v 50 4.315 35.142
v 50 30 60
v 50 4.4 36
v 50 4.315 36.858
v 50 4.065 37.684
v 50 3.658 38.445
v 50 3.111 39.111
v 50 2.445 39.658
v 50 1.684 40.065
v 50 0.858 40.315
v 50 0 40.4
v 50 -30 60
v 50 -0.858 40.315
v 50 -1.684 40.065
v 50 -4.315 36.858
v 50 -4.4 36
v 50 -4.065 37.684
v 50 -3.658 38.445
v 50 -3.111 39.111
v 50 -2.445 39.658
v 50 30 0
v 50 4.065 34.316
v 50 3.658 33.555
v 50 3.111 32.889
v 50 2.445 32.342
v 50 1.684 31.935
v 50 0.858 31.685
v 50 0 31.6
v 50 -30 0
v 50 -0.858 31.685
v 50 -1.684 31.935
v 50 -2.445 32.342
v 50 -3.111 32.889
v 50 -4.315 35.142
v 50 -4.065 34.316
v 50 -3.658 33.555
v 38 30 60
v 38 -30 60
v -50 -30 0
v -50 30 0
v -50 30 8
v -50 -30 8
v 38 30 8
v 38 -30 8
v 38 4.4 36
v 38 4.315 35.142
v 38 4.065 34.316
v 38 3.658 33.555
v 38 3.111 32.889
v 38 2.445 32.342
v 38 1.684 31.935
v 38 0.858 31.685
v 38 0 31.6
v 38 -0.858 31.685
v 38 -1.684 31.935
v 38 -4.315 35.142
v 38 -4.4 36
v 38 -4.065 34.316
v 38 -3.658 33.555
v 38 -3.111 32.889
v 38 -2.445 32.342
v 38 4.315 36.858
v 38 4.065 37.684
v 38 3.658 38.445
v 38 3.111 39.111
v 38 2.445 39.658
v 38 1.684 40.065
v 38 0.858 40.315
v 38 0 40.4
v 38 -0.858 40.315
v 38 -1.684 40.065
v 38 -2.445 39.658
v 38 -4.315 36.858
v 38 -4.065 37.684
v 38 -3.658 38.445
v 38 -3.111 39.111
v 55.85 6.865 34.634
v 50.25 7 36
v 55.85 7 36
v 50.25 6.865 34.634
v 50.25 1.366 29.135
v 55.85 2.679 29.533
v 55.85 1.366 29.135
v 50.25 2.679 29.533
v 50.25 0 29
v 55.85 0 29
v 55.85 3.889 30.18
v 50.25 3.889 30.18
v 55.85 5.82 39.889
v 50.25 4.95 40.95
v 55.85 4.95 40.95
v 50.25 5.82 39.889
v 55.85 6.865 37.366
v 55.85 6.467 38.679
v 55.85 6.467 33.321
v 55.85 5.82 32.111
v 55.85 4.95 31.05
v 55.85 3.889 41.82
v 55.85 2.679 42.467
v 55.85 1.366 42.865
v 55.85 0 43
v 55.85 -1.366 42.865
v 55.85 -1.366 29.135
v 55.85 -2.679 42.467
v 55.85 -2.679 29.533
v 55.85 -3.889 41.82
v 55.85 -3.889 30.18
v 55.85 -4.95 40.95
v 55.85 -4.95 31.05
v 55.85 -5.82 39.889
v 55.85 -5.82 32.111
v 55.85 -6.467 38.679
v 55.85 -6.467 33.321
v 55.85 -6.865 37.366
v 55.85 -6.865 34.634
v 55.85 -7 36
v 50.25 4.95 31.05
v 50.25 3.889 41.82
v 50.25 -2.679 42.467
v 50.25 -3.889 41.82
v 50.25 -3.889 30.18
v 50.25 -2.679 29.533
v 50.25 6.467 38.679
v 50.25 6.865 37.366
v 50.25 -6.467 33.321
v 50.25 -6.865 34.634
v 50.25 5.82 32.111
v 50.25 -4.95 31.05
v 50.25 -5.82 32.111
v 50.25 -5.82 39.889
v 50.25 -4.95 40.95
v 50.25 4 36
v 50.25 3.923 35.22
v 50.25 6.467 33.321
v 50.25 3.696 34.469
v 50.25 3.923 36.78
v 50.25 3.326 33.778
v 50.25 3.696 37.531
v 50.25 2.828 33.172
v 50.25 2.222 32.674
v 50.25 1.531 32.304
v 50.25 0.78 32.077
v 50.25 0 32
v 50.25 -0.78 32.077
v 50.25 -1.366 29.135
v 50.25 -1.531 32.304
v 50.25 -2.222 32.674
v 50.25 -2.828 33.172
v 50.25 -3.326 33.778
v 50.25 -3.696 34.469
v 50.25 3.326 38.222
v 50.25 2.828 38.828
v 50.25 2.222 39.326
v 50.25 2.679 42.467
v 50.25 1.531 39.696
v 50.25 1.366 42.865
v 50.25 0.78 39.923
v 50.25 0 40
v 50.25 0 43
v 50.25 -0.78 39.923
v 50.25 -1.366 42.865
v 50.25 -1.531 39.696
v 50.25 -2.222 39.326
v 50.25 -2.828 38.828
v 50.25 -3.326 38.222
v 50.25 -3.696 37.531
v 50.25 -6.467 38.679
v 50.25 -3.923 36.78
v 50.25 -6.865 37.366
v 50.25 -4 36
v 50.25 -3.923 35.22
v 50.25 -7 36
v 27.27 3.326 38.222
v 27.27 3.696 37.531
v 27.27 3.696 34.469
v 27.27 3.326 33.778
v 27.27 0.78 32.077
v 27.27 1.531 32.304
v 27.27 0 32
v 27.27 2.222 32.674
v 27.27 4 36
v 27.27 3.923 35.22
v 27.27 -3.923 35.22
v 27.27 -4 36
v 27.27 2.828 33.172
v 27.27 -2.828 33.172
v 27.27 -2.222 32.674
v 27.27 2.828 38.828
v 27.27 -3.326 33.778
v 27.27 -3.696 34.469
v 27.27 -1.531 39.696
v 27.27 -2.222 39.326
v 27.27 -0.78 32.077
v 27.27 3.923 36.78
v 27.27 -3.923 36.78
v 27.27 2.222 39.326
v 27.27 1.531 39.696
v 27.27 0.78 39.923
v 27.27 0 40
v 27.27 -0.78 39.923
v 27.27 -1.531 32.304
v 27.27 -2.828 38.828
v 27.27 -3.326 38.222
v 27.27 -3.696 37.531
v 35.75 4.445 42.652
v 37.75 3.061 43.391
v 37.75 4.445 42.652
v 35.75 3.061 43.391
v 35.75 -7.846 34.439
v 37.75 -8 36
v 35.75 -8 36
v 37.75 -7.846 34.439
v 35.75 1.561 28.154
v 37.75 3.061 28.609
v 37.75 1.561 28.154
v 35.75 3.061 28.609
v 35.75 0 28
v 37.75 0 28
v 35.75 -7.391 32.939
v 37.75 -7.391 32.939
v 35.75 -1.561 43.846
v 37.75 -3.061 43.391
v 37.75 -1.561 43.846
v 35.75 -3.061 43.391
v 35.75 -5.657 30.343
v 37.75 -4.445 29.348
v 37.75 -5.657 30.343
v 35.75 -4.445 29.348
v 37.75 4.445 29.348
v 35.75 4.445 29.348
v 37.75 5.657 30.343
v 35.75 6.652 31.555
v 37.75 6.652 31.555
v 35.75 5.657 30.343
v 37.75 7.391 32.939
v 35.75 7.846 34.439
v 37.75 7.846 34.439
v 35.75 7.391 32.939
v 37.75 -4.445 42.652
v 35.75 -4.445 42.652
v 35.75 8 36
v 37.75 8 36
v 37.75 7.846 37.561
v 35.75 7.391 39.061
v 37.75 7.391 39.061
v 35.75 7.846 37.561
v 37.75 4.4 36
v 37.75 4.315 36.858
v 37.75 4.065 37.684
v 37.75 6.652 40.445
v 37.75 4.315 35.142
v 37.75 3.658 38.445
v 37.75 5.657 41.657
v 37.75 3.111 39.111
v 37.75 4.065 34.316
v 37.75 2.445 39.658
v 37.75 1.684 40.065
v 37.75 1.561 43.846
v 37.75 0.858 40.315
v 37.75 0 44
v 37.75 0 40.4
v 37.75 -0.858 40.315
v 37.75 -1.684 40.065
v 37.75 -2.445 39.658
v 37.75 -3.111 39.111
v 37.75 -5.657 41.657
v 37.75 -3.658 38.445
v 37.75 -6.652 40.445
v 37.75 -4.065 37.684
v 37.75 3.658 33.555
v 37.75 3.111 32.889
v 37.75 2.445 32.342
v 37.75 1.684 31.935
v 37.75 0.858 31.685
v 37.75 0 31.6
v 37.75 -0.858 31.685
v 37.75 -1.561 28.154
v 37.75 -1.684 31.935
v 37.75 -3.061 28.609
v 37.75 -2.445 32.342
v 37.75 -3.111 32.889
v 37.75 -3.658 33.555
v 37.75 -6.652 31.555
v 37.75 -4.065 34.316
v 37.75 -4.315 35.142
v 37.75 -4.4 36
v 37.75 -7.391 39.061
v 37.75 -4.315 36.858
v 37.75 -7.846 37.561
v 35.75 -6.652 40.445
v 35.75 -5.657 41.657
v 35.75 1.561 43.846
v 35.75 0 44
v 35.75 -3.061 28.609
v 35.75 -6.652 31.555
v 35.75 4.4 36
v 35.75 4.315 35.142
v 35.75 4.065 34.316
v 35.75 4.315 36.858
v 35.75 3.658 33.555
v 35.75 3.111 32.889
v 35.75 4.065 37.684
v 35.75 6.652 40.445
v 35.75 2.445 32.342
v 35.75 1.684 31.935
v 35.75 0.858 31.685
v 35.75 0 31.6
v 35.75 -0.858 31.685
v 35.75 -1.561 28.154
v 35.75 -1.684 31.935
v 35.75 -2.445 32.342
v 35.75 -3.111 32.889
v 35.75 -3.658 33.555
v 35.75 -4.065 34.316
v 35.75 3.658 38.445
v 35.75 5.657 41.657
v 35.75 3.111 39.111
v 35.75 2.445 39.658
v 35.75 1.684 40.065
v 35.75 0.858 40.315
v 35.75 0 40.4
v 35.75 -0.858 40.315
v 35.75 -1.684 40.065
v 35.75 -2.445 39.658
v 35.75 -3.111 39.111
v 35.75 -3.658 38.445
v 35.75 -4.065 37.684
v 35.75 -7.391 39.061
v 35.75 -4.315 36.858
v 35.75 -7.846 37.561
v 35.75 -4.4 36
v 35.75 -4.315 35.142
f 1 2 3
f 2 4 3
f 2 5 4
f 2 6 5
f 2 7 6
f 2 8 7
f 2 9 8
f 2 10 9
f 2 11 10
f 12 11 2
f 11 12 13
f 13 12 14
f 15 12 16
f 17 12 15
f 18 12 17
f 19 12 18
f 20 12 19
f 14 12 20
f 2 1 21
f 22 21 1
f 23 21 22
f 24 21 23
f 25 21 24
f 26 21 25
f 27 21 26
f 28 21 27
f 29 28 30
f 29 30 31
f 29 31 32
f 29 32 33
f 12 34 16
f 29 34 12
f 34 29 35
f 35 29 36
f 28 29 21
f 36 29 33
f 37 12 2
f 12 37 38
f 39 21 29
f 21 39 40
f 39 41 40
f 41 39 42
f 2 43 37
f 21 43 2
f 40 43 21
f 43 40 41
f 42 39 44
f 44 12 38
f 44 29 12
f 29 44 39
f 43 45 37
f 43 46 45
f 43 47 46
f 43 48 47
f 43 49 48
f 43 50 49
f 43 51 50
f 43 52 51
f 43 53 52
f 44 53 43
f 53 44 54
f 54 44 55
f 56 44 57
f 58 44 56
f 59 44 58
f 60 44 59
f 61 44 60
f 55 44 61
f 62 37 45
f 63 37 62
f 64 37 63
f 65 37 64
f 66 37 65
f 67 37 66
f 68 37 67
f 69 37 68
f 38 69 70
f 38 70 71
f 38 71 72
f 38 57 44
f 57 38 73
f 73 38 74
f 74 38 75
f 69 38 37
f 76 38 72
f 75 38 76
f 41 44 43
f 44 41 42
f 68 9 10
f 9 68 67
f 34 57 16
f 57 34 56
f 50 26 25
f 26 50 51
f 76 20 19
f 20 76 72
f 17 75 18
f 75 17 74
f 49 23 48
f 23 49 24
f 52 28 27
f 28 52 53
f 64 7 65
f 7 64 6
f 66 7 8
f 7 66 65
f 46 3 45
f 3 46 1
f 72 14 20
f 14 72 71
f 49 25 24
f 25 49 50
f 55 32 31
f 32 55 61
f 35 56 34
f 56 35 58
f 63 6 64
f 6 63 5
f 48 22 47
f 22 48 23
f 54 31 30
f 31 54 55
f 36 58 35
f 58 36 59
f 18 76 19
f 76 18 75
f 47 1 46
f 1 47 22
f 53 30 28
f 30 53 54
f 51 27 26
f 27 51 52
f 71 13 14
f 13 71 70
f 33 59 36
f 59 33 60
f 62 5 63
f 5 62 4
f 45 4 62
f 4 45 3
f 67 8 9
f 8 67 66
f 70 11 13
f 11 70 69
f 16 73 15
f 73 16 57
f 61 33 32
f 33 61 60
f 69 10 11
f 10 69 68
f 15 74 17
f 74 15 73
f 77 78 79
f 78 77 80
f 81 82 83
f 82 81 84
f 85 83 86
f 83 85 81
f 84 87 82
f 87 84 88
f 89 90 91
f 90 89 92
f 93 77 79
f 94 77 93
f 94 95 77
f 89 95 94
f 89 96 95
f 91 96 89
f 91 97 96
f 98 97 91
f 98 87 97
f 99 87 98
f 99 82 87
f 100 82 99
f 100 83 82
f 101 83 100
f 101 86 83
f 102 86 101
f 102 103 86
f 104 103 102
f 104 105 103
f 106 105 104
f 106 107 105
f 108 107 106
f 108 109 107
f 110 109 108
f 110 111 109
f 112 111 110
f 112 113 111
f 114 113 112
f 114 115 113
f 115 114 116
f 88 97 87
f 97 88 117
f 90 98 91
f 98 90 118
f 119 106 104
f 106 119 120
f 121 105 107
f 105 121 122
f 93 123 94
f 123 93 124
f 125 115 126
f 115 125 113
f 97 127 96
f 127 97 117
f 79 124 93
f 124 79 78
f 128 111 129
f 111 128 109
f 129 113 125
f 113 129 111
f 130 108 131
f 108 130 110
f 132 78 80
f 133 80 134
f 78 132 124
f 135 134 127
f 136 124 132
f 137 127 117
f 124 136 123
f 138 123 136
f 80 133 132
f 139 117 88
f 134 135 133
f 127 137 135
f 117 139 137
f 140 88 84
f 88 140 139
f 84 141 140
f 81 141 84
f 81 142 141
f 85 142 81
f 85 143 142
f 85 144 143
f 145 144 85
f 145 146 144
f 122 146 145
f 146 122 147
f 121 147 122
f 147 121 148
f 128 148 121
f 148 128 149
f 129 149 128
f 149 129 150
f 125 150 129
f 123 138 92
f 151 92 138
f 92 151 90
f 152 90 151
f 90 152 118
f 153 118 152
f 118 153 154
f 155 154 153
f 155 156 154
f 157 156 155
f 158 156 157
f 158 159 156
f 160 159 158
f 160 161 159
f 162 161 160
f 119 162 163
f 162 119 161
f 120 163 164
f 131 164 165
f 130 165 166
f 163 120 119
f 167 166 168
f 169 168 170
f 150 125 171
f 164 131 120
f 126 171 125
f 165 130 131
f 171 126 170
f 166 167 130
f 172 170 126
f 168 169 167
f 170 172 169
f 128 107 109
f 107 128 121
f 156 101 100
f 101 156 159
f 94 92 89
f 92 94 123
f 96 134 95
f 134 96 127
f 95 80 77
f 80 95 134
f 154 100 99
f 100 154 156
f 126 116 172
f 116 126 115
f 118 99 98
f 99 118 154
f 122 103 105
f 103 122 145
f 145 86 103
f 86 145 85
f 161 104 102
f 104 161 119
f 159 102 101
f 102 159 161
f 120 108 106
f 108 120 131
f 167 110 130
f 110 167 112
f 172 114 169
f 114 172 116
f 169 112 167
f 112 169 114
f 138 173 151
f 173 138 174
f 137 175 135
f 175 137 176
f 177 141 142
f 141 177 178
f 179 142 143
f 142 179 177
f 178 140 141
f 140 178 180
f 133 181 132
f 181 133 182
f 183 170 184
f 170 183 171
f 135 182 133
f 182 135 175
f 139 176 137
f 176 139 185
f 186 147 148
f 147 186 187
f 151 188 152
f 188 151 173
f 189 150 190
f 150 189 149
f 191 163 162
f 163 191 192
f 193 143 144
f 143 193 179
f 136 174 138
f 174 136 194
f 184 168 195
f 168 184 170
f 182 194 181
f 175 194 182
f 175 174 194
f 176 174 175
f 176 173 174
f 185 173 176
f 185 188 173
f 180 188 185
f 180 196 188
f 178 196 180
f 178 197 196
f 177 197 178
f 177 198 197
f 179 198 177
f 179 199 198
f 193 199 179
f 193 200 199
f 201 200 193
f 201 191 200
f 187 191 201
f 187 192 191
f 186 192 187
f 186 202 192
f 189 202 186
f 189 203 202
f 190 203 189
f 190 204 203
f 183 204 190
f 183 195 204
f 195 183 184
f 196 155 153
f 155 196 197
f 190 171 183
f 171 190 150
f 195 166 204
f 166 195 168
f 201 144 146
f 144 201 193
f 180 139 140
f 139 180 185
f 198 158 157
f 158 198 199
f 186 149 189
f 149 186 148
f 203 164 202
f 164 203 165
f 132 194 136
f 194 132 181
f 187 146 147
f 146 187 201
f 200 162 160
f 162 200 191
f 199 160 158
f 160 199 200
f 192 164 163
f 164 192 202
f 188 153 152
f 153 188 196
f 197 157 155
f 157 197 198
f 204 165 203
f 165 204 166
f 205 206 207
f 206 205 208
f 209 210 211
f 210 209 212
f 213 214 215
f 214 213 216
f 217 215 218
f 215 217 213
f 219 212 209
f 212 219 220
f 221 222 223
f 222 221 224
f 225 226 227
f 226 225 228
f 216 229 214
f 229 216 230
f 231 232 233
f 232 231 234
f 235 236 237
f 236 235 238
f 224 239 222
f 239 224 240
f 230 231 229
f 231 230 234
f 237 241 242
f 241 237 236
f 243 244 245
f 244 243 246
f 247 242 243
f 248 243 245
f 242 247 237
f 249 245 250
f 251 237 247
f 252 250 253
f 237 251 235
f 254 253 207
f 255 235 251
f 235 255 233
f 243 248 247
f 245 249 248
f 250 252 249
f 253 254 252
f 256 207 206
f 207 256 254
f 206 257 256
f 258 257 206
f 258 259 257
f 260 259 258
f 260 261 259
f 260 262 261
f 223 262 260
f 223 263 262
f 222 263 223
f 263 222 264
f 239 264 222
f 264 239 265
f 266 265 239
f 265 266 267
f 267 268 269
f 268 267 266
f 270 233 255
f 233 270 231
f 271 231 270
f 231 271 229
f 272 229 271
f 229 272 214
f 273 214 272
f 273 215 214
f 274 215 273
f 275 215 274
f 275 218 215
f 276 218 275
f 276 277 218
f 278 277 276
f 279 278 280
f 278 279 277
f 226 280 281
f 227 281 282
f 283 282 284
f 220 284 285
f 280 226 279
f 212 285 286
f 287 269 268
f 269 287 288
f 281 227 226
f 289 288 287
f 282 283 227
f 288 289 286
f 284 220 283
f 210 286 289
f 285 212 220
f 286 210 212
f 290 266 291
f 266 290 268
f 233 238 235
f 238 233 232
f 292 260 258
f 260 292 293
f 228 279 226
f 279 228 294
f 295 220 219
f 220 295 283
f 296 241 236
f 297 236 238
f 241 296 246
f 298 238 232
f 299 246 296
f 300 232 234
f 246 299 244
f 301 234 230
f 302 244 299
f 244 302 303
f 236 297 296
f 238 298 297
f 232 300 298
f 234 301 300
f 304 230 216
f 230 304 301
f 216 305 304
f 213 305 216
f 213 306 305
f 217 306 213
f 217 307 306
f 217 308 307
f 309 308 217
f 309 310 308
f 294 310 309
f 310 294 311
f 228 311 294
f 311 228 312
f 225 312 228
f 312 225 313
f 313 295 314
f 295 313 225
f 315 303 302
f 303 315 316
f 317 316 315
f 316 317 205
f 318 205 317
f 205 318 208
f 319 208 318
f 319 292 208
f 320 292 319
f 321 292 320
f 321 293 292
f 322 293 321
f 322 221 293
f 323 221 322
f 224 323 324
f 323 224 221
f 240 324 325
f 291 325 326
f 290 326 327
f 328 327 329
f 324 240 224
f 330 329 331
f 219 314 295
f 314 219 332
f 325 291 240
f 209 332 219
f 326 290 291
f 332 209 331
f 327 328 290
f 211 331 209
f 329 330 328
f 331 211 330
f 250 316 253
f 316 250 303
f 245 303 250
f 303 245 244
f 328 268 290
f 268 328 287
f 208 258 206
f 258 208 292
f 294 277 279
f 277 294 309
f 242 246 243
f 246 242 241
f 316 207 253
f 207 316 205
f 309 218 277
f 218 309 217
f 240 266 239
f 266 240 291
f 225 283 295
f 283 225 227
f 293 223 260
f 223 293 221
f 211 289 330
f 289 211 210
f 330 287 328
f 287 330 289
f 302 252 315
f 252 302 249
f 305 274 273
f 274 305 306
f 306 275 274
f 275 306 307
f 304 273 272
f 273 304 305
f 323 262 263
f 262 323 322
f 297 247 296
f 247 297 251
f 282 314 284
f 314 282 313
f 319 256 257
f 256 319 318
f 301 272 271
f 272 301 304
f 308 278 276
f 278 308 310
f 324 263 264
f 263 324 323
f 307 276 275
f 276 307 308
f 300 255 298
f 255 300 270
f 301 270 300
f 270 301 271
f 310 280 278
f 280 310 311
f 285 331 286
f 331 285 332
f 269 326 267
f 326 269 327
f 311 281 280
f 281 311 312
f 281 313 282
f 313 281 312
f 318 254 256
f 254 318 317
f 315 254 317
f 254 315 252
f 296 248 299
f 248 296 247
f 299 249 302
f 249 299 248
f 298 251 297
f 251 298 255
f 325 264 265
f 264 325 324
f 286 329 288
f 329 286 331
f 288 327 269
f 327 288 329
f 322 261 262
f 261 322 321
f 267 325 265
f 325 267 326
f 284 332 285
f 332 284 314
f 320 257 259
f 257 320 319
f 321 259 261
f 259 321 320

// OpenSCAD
$fn = 32;

// ------------------------------------------------------------------------
// Bolted bracket: 100 x 60 mm bracket with 1 bolt joints
// Every part is its own module, assembly() places them once.
// ------------------------------------------------------------------------

// --- part 1 ---
module bracket() {
  difference() {
    translate([-50, -30, 0]) cube([100, 60, 60]);
    translate([-51, -31, 8]) cube([89, 62, 53]);
    translate([44, 0, 36]) rotate([0, 90, 0]) cylinder(h = 14, d = 8.8, center = true);
  }
}

// --- part 2 ---
module bolt() {
  cylinder(h = 5.6, d = 14);
  translate([0, 0, -22.98]) cylinder(h = 22.98, d = 8);
}

// --- part 3 ---
module washer() {
  difference() {
      translate([0, 0, 0]) cylinder(h = 2, d = 16);
      translate([0, 0, -1]) cylinder(h = 4, d = 8.8);
    }
}

// --- assembly ---
module assembly() {
  translate([0, 0, 0]) rotate([0, 0, 0]) bracket();
  translate([50.25, 0, 36]) rotate([0, 90, 0]) bolt();
  translate([35.75, 0, 36]) rotate([0, 90, 0]) washer();
}

assembly();
